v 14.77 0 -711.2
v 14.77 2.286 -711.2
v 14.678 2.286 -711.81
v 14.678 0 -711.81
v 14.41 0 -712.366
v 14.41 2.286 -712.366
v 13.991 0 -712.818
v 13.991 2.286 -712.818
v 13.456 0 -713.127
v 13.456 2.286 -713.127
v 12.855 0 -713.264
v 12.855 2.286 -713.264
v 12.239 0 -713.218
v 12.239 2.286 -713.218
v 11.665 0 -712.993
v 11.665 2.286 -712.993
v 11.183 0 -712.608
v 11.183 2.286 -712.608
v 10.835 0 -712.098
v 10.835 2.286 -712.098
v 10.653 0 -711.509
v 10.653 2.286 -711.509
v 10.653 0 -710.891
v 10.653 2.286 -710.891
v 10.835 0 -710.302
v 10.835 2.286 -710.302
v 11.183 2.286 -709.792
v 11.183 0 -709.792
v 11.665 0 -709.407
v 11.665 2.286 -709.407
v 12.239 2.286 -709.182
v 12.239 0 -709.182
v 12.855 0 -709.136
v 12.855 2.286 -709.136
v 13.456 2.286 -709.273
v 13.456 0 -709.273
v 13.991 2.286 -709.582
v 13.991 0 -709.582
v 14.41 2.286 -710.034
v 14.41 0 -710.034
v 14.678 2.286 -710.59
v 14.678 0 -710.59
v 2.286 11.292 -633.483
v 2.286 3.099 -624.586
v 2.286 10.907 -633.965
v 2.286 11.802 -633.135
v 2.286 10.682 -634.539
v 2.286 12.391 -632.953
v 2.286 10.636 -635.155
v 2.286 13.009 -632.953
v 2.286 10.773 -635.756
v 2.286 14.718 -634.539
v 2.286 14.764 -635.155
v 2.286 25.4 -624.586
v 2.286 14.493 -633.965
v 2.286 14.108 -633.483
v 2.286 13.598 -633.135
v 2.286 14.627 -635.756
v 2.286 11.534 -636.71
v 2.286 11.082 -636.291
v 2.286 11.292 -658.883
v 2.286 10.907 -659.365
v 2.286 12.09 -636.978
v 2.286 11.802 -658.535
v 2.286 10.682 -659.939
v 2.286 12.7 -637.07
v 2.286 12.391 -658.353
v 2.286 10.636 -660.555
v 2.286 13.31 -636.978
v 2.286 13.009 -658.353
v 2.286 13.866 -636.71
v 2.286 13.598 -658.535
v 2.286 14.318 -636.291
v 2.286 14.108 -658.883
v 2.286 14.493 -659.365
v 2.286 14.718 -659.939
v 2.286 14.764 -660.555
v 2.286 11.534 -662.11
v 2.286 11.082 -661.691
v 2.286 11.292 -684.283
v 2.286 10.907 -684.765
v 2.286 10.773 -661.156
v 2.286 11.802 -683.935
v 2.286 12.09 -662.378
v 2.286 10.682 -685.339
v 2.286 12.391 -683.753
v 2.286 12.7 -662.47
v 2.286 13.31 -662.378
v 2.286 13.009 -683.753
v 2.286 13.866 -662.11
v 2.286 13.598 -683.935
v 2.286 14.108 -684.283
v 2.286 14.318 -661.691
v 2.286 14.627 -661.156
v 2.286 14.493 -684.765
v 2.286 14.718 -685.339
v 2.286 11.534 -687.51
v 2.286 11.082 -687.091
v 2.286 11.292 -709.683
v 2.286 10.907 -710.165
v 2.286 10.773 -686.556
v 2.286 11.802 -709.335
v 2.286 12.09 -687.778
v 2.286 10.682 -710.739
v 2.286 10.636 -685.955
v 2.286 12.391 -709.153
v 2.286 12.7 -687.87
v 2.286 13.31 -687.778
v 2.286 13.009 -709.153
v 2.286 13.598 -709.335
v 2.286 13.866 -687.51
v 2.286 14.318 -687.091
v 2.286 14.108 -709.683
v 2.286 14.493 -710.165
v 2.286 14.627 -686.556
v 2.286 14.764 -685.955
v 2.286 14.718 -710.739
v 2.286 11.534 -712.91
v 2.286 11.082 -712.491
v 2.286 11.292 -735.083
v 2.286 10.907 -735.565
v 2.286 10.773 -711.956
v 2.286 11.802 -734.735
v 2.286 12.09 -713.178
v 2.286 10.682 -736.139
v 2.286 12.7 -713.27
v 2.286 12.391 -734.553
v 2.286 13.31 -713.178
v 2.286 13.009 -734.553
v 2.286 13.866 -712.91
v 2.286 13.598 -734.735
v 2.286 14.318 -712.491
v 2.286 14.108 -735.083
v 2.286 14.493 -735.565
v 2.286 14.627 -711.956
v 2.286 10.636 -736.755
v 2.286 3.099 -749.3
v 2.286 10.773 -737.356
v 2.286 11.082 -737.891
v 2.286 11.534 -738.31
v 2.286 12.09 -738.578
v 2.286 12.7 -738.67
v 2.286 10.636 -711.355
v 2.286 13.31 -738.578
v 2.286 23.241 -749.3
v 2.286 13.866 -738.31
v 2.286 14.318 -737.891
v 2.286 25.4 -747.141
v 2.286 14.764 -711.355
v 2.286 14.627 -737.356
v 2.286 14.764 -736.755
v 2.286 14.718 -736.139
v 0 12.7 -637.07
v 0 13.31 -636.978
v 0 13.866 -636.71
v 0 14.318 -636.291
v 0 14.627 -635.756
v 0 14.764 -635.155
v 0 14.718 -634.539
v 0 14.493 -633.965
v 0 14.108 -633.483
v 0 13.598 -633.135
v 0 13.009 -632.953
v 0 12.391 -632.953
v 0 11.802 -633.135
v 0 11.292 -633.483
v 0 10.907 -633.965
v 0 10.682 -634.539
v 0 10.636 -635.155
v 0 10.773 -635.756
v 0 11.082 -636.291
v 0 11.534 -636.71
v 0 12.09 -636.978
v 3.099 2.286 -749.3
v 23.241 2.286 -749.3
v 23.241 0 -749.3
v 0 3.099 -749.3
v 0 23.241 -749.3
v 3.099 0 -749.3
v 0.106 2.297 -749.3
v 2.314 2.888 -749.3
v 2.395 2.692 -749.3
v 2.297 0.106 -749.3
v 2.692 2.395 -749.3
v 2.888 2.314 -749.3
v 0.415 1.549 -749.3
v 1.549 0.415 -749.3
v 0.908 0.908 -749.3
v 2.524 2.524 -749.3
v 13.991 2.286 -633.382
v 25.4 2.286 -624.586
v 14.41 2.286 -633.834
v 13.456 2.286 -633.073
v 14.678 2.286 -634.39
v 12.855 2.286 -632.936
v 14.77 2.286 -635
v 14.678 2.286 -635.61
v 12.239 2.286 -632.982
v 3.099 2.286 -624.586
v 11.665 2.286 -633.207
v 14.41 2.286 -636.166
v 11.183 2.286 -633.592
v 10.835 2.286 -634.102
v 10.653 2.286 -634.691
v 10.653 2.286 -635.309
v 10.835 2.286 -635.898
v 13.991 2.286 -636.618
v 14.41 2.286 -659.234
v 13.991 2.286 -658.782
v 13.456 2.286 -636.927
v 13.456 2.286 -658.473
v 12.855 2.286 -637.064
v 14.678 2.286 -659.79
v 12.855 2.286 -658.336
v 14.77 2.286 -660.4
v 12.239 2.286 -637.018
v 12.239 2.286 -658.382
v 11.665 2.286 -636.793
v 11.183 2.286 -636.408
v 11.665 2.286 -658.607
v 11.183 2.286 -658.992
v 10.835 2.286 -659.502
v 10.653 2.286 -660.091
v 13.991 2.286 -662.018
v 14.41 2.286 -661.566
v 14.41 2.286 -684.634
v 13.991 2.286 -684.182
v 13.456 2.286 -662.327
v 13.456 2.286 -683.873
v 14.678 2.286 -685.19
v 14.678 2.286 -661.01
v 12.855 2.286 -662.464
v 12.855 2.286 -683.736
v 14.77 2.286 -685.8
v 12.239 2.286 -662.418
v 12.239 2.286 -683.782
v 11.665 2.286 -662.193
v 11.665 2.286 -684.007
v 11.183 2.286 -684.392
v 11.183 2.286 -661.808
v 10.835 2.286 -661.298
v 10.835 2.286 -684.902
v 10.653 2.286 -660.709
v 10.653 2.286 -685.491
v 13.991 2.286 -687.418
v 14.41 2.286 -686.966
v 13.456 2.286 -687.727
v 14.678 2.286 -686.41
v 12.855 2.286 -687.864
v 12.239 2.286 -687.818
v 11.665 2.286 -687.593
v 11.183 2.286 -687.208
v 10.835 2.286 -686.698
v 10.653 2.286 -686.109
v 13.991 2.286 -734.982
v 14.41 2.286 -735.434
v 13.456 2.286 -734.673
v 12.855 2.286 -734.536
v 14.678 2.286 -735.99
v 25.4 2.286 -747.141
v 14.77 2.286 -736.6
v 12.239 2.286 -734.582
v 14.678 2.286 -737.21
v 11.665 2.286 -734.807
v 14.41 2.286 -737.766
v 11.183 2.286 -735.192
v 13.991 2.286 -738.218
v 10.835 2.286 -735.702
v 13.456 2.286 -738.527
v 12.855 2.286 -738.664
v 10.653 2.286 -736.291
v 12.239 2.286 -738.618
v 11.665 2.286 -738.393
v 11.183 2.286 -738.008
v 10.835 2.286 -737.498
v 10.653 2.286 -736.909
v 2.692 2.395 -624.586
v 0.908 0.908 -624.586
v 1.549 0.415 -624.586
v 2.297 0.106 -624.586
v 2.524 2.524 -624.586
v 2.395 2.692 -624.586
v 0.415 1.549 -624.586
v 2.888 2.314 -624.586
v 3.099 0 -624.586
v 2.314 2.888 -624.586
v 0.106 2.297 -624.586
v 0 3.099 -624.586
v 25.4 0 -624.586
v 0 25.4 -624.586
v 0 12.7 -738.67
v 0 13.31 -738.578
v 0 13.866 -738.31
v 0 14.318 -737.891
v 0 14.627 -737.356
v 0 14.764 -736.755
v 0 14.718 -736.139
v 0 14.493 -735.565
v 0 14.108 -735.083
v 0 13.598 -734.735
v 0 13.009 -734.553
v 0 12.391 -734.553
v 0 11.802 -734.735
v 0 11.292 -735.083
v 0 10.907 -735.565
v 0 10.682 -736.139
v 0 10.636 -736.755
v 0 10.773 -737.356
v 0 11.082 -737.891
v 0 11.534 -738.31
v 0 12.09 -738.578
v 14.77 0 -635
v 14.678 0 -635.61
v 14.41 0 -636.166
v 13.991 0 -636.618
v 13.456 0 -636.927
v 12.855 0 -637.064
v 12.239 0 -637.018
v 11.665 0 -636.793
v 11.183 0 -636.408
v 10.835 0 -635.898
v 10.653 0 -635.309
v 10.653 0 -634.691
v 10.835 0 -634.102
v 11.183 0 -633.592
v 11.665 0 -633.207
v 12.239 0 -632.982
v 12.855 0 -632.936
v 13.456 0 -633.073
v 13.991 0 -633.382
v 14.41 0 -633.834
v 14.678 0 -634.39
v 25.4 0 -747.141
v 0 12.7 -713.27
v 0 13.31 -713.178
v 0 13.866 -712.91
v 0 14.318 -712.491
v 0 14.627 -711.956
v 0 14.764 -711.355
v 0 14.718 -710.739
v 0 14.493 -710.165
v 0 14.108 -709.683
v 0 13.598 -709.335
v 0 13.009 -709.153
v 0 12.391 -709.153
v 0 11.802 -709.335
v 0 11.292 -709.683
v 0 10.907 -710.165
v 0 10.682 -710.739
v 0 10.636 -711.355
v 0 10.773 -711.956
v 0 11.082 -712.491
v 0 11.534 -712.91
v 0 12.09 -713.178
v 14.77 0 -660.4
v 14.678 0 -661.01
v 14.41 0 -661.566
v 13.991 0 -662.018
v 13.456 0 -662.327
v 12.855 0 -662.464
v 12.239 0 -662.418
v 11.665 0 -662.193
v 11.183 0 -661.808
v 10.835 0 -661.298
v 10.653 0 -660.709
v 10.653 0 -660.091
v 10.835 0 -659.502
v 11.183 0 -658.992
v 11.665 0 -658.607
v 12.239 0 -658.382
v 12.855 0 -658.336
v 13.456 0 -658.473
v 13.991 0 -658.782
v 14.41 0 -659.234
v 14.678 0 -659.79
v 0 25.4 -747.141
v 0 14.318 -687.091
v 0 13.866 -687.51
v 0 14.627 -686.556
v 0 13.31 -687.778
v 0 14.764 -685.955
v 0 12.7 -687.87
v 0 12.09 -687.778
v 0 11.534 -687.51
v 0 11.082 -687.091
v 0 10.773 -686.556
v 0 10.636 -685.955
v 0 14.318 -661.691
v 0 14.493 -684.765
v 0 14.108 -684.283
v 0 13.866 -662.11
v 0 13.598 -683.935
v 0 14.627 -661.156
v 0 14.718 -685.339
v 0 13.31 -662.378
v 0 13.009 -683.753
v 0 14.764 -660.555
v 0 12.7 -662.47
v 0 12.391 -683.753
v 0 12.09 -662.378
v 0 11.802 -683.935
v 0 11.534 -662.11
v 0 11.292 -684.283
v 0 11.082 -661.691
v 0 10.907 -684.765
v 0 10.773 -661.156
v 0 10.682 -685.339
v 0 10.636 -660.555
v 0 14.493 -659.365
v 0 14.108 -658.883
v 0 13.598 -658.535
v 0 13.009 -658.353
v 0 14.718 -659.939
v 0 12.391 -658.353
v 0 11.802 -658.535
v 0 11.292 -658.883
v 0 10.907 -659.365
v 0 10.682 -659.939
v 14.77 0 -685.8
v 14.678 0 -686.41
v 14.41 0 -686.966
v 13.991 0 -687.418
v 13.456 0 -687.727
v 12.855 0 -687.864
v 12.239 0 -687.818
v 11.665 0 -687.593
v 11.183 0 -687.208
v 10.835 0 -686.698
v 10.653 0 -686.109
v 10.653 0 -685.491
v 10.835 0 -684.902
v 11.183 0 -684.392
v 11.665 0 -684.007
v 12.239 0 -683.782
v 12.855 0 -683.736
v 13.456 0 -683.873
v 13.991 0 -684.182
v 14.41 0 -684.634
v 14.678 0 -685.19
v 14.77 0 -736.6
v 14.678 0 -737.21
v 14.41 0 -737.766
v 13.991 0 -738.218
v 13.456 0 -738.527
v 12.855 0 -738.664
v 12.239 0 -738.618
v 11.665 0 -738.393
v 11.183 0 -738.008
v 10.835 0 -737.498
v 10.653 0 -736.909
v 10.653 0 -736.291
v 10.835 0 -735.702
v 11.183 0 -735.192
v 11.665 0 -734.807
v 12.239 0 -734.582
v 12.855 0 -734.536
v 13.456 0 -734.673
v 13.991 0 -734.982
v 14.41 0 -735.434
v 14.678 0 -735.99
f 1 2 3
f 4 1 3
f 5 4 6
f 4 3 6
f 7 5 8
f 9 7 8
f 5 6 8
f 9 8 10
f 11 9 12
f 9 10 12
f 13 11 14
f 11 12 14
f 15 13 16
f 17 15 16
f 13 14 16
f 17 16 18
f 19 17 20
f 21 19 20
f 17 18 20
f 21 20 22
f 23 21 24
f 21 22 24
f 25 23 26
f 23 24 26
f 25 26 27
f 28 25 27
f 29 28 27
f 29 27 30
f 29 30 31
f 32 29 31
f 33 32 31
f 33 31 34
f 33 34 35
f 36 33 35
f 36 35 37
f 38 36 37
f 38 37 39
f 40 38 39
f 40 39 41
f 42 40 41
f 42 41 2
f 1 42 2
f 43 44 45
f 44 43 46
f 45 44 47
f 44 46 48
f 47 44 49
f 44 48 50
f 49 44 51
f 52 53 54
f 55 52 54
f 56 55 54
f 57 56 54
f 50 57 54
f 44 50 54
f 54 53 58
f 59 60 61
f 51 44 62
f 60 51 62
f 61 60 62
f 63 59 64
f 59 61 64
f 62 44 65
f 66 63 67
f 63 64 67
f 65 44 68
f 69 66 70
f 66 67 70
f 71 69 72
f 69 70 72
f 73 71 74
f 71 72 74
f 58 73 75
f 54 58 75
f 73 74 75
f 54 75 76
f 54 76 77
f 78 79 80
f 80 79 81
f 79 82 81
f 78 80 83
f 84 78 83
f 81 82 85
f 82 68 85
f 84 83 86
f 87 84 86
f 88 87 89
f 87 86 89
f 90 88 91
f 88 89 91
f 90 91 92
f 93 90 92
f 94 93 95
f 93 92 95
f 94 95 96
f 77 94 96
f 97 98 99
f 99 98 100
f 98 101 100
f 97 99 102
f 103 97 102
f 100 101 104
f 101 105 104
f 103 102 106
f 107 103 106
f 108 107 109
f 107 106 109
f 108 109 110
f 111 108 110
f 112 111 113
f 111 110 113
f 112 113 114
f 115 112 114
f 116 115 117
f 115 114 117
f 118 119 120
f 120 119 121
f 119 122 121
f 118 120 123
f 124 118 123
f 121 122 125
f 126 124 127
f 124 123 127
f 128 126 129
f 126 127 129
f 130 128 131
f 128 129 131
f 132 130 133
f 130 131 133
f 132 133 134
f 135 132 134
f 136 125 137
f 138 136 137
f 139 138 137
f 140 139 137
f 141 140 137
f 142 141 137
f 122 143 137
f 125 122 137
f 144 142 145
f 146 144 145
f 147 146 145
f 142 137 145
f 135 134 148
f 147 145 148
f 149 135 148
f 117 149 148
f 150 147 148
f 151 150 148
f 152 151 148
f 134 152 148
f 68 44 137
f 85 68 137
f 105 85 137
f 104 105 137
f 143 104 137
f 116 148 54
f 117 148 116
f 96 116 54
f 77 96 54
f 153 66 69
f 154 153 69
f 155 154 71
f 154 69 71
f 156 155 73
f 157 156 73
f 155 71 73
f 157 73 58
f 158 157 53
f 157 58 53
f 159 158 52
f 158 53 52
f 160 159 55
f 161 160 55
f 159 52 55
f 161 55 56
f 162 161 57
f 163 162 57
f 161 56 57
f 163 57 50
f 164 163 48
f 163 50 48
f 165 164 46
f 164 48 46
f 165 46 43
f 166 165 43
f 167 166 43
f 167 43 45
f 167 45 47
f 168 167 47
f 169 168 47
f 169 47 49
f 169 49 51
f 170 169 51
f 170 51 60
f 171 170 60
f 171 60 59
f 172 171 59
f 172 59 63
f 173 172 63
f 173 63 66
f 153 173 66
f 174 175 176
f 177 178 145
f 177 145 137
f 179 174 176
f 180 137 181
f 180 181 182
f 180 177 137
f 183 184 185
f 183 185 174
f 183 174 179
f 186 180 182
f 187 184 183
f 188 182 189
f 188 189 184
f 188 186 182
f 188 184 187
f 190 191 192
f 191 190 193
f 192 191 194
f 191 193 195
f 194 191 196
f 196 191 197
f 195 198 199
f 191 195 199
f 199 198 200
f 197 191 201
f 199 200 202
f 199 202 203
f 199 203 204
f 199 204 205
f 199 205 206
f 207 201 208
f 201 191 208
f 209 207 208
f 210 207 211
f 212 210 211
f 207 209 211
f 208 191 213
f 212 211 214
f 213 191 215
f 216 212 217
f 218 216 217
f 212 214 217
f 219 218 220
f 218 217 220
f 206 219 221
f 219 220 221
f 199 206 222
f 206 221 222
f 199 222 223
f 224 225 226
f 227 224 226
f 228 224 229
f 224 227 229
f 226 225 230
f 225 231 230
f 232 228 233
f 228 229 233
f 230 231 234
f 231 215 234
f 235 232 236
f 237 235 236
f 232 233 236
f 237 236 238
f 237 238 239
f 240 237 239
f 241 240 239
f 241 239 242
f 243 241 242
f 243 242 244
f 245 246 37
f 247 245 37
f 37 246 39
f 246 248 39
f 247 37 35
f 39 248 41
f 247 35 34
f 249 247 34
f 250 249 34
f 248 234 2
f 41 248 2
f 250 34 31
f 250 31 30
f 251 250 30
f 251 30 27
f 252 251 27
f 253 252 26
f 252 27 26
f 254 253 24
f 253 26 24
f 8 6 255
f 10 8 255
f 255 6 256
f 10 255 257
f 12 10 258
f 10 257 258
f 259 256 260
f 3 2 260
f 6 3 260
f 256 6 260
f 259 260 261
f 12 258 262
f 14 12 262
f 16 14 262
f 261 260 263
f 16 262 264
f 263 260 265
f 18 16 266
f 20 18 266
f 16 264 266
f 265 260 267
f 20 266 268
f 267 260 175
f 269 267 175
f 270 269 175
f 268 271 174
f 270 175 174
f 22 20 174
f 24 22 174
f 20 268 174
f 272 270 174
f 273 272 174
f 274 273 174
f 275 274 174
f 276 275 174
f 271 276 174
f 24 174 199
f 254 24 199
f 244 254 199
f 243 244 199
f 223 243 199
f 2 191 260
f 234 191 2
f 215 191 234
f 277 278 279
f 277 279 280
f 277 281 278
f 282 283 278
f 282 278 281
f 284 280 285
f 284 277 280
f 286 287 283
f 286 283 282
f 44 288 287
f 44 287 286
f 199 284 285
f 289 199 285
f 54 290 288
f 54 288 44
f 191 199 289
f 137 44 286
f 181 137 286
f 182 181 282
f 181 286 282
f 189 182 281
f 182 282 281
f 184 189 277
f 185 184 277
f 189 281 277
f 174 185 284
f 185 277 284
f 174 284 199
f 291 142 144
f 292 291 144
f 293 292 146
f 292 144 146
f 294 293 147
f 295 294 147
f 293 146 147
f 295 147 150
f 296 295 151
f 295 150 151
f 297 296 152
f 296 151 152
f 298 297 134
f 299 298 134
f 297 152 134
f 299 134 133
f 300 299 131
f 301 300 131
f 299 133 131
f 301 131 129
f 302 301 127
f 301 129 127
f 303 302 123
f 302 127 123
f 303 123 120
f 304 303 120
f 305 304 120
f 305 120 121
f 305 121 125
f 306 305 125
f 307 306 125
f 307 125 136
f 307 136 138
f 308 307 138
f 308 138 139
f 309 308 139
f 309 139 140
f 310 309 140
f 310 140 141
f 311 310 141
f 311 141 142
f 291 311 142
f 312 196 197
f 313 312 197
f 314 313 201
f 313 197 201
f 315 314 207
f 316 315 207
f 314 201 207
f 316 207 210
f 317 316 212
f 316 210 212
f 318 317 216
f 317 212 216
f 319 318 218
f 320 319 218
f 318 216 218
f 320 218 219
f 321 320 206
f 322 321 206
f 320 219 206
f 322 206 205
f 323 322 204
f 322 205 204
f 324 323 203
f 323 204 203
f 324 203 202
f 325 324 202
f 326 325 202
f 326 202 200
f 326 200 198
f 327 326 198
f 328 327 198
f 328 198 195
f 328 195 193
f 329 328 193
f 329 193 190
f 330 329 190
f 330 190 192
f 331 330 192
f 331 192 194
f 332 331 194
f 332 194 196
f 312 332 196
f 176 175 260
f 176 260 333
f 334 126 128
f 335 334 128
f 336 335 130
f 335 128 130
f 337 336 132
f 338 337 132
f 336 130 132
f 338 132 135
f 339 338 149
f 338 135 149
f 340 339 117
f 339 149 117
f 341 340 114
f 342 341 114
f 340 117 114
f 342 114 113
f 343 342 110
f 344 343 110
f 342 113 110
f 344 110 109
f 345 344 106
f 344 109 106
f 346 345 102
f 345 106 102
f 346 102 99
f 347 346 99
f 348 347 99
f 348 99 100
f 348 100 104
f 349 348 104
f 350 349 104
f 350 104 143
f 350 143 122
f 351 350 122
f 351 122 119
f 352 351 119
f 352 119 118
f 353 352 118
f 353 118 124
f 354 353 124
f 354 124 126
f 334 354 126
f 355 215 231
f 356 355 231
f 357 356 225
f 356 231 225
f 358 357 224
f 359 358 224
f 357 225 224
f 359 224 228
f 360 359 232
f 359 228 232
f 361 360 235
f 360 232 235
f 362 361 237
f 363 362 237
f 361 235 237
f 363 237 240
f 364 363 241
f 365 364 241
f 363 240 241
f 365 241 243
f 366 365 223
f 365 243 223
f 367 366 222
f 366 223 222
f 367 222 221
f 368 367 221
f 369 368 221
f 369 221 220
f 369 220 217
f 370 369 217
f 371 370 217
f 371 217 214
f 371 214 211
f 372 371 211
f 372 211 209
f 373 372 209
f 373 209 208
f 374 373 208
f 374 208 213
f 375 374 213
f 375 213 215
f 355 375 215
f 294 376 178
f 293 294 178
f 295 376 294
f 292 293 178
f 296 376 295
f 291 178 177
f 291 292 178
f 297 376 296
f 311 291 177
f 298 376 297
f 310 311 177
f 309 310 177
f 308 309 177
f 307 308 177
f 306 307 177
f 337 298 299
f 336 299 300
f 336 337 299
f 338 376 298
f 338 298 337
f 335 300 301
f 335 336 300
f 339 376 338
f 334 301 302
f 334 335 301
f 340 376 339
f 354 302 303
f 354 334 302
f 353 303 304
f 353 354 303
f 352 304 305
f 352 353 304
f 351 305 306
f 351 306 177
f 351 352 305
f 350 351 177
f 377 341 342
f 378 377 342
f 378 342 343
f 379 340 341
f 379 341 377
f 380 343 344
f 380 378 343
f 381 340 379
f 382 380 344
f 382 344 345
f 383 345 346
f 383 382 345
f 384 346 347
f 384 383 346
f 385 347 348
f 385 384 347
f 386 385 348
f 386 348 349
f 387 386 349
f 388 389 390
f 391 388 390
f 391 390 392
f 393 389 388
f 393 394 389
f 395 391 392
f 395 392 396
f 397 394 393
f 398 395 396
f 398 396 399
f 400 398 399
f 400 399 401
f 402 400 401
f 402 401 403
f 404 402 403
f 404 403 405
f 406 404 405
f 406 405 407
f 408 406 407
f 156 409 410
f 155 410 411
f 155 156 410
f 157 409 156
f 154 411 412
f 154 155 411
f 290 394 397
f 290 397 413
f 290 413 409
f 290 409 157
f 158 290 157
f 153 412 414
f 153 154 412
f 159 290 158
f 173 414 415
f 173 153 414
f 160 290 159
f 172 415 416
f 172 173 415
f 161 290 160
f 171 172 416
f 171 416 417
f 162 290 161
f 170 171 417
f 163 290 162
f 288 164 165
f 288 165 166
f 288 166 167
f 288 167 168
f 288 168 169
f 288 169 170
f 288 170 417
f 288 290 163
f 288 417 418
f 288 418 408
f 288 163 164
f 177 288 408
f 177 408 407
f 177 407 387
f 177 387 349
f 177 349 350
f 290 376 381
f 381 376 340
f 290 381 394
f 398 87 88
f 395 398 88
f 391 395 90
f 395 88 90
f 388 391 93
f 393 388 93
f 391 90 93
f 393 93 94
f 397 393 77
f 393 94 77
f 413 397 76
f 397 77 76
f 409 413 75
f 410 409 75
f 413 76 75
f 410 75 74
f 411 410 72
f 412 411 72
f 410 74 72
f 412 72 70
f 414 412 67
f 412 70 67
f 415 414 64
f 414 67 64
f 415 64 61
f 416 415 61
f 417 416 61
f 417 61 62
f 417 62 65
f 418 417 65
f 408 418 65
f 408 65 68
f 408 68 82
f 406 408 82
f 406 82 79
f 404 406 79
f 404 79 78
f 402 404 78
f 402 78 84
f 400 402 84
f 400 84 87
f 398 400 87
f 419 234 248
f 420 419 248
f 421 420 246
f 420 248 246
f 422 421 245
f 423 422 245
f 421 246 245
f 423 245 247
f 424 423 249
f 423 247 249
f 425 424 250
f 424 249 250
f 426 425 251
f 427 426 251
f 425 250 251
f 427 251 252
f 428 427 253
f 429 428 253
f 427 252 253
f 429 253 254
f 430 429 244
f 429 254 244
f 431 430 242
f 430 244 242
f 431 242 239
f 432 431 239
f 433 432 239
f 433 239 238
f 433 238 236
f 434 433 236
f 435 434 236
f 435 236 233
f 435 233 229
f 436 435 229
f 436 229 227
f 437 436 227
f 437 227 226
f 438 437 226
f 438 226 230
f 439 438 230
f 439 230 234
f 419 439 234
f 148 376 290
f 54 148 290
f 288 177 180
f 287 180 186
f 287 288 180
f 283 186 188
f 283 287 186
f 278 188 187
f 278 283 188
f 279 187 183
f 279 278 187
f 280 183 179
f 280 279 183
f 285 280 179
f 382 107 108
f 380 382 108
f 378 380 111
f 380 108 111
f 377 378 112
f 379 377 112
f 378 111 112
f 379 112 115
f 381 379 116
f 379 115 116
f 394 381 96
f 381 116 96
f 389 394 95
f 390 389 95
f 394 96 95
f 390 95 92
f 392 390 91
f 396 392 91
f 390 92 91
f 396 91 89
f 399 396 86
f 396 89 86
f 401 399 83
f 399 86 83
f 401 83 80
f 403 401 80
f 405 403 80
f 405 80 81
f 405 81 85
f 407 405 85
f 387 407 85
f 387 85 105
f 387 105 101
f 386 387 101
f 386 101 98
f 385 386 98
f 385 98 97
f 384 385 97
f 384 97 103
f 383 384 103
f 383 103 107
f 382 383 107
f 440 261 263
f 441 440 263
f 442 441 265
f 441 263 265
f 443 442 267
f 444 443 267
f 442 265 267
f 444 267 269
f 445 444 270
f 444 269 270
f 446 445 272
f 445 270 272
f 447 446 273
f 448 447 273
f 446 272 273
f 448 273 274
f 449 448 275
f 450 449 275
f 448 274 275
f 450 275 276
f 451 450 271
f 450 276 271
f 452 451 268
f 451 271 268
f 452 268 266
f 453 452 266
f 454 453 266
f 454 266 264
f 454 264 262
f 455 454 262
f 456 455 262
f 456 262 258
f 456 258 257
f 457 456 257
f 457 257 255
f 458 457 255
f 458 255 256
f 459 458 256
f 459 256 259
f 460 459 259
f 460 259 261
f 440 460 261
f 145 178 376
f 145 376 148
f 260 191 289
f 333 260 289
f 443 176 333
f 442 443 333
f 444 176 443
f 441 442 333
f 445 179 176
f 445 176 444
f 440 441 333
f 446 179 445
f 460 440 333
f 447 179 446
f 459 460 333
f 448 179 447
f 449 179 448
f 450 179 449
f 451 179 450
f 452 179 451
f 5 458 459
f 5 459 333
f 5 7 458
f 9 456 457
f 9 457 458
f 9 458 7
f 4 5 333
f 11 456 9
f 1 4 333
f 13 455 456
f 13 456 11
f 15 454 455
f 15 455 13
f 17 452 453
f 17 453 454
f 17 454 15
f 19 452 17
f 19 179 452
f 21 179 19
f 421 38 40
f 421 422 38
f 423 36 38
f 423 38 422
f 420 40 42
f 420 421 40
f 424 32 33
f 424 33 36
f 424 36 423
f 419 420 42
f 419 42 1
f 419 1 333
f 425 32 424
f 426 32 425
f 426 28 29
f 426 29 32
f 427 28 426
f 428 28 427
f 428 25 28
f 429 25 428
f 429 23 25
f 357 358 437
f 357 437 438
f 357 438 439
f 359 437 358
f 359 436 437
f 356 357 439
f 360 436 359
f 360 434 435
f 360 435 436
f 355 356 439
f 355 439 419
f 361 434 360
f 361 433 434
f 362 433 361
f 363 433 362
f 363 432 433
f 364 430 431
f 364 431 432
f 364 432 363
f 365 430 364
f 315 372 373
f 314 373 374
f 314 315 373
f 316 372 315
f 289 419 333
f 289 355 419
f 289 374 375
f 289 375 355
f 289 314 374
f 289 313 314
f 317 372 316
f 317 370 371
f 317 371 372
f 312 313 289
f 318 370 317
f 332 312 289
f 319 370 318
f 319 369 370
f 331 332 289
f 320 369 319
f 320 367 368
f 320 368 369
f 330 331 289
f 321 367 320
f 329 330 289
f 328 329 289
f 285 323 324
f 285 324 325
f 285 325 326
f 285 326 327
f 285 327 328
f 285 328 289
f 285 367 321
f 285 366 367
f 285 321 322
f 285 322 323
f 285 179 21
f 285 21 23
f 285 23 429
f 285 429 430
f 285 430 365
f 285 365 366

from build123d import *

# Parameters (mm, degrees)
SKETCH1_W                  = 25.4
SKETCH1_H                  = 1498.6
BOSS_EXTRUDE1_DEPTH        = 25.4
SKETCH2_W                  = 23.114
SKETCH2_H                  = 23.114
CUT_EXTRUDE1_DEPTH         = 1499.6
M3_5_CLEARANCE_HOLE1_D     = 4.1402
M3_5_CLEARANCE_HOLE1_DEPTH = 25.4
M3_5_CLEARANCE_HOLE2_D     = 4.1402
M3_5_CLEARANCE_HOLE2_DEPTH = 25.4
CHAMFER1_SIZE              = 2.159
FILLET1_R                  = 0.8128
FILLET2_R                  = 3.0988
SKETCH8_W                  = 95.882963774
SKETCH8_H                  = 79.338329604
CUT_EXTRUDE3_DEPTH         = 1371.6
SKETCH11_W                 = 51.462522779
SKETCH11_H                 = 66.676735099
CUT_EXTRUDE6_DEPTH         = 2.286


with BuildPart() as part:
    # Sketch1 → Boss-Extrude1 (new body)
    with BuildSketch(Plane(origin=(0, 0, 0), x_dir=(0, -1, 0), z_dir=(-1, 0, 0))):
        with Locations((-12.7, 0)):
            Rectangle(SKETCH1_W, SKETCH1_H)
    extrude(amount=-BOSS_EXTRUDE1_DEPTH)

    # Sketch2 → Cut-Extrude1 (cut, through all)
    with BuildSketch(Plane(origin=(0, 0, -749.3), x_dir=(-1, 0, 0), z_dir=(0, 0, -1))):
        with Locations((-13.843, 13.843)):
            Rectangle(SKETCH2_W, SKETCH2_H)
    extrude(amount=-CUT_EXTRUDE1_DEPTH, mode=Mode.SUBTRACT)

    # M3.5 Clearance Hole1
    with Locations(Plane(origin=(0, 0, 0), x_dir=(-1, 0, 0), z_dir=(0, -1, 0))):
        with Locations((-12.7, 736.6), (-12.7, 711.2), (-12.7, 685.8), (-12.7, 660.4), (-12.7, 635), (-12.7, 609.6), (-12.7, 584.2), (-12.7, 558.8), (-12.7, 533.4), (-12.7, 508), (-12.7, 482.6), (-12.7, 457.2), (-12.7, 431.8), (-12.7, 406.4), (-12.7, 381), (-12.7, 355.6), (-12.7, 330.2), (-12.7, 304.8), (-12.7, 279.4), (-12.7, 254), (-12.7, 228.6), (-12.7, 203.2), (-12.7, 177.8), (-12.7, 152.4), (-12.7, 127), (-12.7, 101.6), (-12.7, 76.2), (-12.7, 50.8), (-12.7, 25.4), (-12.7, 0), (-12.7, -25.4), (-12.7, -50.8), (-12.7, -76.2), (-12.7, -101.6), (-12.7, -127), (-12.7, -152.4), (-12.7, -177.8), (-12.7, -203.2), (-12.7, -228.6), (-12.7, -254), (-12.7, -279.4), (-12.7, -304.8), (-12.7, -330.2), (-12.7, -355.6), (-12.7, -381), (-12.7, -406.4), (-12.7, -431.8), (-12.7, -457.2), (-12.7, -482.6), (-12.7, -508), (-12.7, -533.4), (-12.7, -558.8), (-12.7, -584.2), (-12.7, -609.6), (-12.7, -635), (-12.7, -660.4), (-12.7, -685.8), (-12.7, -711.2), (-12.7, -736.6)):
            Hole(M3_5_CLEARANCE_HOLE1_D / 2, depth=M3_5_CLEARANCE_HOLE1_DEPTH)

    # M3.5 Clearance Hole2
    with Locations(Plane.ZY):
        with Locations((711.2, 12.7), (736.6, 12.7), (685.8, 12.7), (660.4, 12.7), (635, 12.7), (609.6, 12.7), (584.2, 12.7), (558.8, 12.7), (533.4, 12.7), (508, 12.7), (482.6, 12.7), (457.2, 12.7), (431.8, 12.7), (406.4, 12.7), (381, 12.7), (355.6, 12.7), (330.2, 12.7), (304.8, 12.7), (279.4, 12.7), (254, 12.7), (228.6, 12.7), (203.2, 12.7), (177.8, 12.7), (152.4, 12.7), (127, 12.7), (101.6, 12.7), (76.2, 12.7), (50.8, 12.7), (25.4, 12.7), (0, 12.7), (-25.4, 12.7), (-50.8, 12.7), (-76.2, 12.7), (-101.6, 12.7), (-127, 12.7), (-152.4, 12.7), (-177.8, 12.7), (-203.2, 12.7), (-228.6, 12.7), (-254, 12.7), (-279.4, 12.7), (-304.8, 12.7), (-330.2, 12.7), (-355.6, 12.7), (-381, 12.7), (-406.4, 12.7), (-431.8, 12.7), (-457.2, 12.7), (-482.6, 12.7), (-508, 12.7), (-533.4, 12.7), (-558.8, 12.7), (-584.2, 12.7), (-609.6, 12.7), (-635, 12.7), (-660.4, 12.7), (-685.8, 12.7), (-711.2, 12.7), (-736.6, 12.7)):
            Hole(M3_5_CLEARANCE_HOLE2_D / 2, depth=M3_5_CLEARANCE_HOLE2_DEPTH)

    # Chamfer1
    chamfer1_edges = [part.edges().sort_by_distance(p)[0] for p in [
        (25.4, 1.143, -749.3),
        (1.143, 25.4, 749.3),
        (1.143, 25.4, -749.3),
        (25.4, 1.143, 749.3),
    ]]
    chamfer(chamfer1_edges, length=CHAMFER1_SIZE)

    # Fillet1
    fillet1_edges = [part.edges().sort_by_distance(p)[0] for p in [
        (2.286, 2.286, 0),
    ]]
    fillet(fillet1_edges, radius=FILLET1_R)

    # Fillet2
    fillet2_edges = [part.edges().sort_by_distance(p)[0] for p in [
        (0, 0, 0),
    ]]
    fillet(fillet2_edges, radius=FILLET2_R)

    # Sketch8 → Cut-Extrude3 (cut)
    with BuildSketch(Plane.XY.offset(749.3)):
        with Locations((2.286, 3.0988)):
            Rectangle(SKETCH8_W, SKETCH8_H)
    extrude(amount=-CUT_EXTRUDE3_DEPTH, mode=Mode.SUBTRACT)

    # Sketch11 → Cut-Extrude6 (cut)
    with BuildSketch(Plane.XY.offset(-622.3)):
        with Locations((1.85517497, 1.74884985)):
            Rectangle(SKETCH11_W, SKETCH11_H)
    extrude(amount=-CUT_EXTRUDE6_DEPTH, mode=Mode.SUBTRACT)


solid = part.part
